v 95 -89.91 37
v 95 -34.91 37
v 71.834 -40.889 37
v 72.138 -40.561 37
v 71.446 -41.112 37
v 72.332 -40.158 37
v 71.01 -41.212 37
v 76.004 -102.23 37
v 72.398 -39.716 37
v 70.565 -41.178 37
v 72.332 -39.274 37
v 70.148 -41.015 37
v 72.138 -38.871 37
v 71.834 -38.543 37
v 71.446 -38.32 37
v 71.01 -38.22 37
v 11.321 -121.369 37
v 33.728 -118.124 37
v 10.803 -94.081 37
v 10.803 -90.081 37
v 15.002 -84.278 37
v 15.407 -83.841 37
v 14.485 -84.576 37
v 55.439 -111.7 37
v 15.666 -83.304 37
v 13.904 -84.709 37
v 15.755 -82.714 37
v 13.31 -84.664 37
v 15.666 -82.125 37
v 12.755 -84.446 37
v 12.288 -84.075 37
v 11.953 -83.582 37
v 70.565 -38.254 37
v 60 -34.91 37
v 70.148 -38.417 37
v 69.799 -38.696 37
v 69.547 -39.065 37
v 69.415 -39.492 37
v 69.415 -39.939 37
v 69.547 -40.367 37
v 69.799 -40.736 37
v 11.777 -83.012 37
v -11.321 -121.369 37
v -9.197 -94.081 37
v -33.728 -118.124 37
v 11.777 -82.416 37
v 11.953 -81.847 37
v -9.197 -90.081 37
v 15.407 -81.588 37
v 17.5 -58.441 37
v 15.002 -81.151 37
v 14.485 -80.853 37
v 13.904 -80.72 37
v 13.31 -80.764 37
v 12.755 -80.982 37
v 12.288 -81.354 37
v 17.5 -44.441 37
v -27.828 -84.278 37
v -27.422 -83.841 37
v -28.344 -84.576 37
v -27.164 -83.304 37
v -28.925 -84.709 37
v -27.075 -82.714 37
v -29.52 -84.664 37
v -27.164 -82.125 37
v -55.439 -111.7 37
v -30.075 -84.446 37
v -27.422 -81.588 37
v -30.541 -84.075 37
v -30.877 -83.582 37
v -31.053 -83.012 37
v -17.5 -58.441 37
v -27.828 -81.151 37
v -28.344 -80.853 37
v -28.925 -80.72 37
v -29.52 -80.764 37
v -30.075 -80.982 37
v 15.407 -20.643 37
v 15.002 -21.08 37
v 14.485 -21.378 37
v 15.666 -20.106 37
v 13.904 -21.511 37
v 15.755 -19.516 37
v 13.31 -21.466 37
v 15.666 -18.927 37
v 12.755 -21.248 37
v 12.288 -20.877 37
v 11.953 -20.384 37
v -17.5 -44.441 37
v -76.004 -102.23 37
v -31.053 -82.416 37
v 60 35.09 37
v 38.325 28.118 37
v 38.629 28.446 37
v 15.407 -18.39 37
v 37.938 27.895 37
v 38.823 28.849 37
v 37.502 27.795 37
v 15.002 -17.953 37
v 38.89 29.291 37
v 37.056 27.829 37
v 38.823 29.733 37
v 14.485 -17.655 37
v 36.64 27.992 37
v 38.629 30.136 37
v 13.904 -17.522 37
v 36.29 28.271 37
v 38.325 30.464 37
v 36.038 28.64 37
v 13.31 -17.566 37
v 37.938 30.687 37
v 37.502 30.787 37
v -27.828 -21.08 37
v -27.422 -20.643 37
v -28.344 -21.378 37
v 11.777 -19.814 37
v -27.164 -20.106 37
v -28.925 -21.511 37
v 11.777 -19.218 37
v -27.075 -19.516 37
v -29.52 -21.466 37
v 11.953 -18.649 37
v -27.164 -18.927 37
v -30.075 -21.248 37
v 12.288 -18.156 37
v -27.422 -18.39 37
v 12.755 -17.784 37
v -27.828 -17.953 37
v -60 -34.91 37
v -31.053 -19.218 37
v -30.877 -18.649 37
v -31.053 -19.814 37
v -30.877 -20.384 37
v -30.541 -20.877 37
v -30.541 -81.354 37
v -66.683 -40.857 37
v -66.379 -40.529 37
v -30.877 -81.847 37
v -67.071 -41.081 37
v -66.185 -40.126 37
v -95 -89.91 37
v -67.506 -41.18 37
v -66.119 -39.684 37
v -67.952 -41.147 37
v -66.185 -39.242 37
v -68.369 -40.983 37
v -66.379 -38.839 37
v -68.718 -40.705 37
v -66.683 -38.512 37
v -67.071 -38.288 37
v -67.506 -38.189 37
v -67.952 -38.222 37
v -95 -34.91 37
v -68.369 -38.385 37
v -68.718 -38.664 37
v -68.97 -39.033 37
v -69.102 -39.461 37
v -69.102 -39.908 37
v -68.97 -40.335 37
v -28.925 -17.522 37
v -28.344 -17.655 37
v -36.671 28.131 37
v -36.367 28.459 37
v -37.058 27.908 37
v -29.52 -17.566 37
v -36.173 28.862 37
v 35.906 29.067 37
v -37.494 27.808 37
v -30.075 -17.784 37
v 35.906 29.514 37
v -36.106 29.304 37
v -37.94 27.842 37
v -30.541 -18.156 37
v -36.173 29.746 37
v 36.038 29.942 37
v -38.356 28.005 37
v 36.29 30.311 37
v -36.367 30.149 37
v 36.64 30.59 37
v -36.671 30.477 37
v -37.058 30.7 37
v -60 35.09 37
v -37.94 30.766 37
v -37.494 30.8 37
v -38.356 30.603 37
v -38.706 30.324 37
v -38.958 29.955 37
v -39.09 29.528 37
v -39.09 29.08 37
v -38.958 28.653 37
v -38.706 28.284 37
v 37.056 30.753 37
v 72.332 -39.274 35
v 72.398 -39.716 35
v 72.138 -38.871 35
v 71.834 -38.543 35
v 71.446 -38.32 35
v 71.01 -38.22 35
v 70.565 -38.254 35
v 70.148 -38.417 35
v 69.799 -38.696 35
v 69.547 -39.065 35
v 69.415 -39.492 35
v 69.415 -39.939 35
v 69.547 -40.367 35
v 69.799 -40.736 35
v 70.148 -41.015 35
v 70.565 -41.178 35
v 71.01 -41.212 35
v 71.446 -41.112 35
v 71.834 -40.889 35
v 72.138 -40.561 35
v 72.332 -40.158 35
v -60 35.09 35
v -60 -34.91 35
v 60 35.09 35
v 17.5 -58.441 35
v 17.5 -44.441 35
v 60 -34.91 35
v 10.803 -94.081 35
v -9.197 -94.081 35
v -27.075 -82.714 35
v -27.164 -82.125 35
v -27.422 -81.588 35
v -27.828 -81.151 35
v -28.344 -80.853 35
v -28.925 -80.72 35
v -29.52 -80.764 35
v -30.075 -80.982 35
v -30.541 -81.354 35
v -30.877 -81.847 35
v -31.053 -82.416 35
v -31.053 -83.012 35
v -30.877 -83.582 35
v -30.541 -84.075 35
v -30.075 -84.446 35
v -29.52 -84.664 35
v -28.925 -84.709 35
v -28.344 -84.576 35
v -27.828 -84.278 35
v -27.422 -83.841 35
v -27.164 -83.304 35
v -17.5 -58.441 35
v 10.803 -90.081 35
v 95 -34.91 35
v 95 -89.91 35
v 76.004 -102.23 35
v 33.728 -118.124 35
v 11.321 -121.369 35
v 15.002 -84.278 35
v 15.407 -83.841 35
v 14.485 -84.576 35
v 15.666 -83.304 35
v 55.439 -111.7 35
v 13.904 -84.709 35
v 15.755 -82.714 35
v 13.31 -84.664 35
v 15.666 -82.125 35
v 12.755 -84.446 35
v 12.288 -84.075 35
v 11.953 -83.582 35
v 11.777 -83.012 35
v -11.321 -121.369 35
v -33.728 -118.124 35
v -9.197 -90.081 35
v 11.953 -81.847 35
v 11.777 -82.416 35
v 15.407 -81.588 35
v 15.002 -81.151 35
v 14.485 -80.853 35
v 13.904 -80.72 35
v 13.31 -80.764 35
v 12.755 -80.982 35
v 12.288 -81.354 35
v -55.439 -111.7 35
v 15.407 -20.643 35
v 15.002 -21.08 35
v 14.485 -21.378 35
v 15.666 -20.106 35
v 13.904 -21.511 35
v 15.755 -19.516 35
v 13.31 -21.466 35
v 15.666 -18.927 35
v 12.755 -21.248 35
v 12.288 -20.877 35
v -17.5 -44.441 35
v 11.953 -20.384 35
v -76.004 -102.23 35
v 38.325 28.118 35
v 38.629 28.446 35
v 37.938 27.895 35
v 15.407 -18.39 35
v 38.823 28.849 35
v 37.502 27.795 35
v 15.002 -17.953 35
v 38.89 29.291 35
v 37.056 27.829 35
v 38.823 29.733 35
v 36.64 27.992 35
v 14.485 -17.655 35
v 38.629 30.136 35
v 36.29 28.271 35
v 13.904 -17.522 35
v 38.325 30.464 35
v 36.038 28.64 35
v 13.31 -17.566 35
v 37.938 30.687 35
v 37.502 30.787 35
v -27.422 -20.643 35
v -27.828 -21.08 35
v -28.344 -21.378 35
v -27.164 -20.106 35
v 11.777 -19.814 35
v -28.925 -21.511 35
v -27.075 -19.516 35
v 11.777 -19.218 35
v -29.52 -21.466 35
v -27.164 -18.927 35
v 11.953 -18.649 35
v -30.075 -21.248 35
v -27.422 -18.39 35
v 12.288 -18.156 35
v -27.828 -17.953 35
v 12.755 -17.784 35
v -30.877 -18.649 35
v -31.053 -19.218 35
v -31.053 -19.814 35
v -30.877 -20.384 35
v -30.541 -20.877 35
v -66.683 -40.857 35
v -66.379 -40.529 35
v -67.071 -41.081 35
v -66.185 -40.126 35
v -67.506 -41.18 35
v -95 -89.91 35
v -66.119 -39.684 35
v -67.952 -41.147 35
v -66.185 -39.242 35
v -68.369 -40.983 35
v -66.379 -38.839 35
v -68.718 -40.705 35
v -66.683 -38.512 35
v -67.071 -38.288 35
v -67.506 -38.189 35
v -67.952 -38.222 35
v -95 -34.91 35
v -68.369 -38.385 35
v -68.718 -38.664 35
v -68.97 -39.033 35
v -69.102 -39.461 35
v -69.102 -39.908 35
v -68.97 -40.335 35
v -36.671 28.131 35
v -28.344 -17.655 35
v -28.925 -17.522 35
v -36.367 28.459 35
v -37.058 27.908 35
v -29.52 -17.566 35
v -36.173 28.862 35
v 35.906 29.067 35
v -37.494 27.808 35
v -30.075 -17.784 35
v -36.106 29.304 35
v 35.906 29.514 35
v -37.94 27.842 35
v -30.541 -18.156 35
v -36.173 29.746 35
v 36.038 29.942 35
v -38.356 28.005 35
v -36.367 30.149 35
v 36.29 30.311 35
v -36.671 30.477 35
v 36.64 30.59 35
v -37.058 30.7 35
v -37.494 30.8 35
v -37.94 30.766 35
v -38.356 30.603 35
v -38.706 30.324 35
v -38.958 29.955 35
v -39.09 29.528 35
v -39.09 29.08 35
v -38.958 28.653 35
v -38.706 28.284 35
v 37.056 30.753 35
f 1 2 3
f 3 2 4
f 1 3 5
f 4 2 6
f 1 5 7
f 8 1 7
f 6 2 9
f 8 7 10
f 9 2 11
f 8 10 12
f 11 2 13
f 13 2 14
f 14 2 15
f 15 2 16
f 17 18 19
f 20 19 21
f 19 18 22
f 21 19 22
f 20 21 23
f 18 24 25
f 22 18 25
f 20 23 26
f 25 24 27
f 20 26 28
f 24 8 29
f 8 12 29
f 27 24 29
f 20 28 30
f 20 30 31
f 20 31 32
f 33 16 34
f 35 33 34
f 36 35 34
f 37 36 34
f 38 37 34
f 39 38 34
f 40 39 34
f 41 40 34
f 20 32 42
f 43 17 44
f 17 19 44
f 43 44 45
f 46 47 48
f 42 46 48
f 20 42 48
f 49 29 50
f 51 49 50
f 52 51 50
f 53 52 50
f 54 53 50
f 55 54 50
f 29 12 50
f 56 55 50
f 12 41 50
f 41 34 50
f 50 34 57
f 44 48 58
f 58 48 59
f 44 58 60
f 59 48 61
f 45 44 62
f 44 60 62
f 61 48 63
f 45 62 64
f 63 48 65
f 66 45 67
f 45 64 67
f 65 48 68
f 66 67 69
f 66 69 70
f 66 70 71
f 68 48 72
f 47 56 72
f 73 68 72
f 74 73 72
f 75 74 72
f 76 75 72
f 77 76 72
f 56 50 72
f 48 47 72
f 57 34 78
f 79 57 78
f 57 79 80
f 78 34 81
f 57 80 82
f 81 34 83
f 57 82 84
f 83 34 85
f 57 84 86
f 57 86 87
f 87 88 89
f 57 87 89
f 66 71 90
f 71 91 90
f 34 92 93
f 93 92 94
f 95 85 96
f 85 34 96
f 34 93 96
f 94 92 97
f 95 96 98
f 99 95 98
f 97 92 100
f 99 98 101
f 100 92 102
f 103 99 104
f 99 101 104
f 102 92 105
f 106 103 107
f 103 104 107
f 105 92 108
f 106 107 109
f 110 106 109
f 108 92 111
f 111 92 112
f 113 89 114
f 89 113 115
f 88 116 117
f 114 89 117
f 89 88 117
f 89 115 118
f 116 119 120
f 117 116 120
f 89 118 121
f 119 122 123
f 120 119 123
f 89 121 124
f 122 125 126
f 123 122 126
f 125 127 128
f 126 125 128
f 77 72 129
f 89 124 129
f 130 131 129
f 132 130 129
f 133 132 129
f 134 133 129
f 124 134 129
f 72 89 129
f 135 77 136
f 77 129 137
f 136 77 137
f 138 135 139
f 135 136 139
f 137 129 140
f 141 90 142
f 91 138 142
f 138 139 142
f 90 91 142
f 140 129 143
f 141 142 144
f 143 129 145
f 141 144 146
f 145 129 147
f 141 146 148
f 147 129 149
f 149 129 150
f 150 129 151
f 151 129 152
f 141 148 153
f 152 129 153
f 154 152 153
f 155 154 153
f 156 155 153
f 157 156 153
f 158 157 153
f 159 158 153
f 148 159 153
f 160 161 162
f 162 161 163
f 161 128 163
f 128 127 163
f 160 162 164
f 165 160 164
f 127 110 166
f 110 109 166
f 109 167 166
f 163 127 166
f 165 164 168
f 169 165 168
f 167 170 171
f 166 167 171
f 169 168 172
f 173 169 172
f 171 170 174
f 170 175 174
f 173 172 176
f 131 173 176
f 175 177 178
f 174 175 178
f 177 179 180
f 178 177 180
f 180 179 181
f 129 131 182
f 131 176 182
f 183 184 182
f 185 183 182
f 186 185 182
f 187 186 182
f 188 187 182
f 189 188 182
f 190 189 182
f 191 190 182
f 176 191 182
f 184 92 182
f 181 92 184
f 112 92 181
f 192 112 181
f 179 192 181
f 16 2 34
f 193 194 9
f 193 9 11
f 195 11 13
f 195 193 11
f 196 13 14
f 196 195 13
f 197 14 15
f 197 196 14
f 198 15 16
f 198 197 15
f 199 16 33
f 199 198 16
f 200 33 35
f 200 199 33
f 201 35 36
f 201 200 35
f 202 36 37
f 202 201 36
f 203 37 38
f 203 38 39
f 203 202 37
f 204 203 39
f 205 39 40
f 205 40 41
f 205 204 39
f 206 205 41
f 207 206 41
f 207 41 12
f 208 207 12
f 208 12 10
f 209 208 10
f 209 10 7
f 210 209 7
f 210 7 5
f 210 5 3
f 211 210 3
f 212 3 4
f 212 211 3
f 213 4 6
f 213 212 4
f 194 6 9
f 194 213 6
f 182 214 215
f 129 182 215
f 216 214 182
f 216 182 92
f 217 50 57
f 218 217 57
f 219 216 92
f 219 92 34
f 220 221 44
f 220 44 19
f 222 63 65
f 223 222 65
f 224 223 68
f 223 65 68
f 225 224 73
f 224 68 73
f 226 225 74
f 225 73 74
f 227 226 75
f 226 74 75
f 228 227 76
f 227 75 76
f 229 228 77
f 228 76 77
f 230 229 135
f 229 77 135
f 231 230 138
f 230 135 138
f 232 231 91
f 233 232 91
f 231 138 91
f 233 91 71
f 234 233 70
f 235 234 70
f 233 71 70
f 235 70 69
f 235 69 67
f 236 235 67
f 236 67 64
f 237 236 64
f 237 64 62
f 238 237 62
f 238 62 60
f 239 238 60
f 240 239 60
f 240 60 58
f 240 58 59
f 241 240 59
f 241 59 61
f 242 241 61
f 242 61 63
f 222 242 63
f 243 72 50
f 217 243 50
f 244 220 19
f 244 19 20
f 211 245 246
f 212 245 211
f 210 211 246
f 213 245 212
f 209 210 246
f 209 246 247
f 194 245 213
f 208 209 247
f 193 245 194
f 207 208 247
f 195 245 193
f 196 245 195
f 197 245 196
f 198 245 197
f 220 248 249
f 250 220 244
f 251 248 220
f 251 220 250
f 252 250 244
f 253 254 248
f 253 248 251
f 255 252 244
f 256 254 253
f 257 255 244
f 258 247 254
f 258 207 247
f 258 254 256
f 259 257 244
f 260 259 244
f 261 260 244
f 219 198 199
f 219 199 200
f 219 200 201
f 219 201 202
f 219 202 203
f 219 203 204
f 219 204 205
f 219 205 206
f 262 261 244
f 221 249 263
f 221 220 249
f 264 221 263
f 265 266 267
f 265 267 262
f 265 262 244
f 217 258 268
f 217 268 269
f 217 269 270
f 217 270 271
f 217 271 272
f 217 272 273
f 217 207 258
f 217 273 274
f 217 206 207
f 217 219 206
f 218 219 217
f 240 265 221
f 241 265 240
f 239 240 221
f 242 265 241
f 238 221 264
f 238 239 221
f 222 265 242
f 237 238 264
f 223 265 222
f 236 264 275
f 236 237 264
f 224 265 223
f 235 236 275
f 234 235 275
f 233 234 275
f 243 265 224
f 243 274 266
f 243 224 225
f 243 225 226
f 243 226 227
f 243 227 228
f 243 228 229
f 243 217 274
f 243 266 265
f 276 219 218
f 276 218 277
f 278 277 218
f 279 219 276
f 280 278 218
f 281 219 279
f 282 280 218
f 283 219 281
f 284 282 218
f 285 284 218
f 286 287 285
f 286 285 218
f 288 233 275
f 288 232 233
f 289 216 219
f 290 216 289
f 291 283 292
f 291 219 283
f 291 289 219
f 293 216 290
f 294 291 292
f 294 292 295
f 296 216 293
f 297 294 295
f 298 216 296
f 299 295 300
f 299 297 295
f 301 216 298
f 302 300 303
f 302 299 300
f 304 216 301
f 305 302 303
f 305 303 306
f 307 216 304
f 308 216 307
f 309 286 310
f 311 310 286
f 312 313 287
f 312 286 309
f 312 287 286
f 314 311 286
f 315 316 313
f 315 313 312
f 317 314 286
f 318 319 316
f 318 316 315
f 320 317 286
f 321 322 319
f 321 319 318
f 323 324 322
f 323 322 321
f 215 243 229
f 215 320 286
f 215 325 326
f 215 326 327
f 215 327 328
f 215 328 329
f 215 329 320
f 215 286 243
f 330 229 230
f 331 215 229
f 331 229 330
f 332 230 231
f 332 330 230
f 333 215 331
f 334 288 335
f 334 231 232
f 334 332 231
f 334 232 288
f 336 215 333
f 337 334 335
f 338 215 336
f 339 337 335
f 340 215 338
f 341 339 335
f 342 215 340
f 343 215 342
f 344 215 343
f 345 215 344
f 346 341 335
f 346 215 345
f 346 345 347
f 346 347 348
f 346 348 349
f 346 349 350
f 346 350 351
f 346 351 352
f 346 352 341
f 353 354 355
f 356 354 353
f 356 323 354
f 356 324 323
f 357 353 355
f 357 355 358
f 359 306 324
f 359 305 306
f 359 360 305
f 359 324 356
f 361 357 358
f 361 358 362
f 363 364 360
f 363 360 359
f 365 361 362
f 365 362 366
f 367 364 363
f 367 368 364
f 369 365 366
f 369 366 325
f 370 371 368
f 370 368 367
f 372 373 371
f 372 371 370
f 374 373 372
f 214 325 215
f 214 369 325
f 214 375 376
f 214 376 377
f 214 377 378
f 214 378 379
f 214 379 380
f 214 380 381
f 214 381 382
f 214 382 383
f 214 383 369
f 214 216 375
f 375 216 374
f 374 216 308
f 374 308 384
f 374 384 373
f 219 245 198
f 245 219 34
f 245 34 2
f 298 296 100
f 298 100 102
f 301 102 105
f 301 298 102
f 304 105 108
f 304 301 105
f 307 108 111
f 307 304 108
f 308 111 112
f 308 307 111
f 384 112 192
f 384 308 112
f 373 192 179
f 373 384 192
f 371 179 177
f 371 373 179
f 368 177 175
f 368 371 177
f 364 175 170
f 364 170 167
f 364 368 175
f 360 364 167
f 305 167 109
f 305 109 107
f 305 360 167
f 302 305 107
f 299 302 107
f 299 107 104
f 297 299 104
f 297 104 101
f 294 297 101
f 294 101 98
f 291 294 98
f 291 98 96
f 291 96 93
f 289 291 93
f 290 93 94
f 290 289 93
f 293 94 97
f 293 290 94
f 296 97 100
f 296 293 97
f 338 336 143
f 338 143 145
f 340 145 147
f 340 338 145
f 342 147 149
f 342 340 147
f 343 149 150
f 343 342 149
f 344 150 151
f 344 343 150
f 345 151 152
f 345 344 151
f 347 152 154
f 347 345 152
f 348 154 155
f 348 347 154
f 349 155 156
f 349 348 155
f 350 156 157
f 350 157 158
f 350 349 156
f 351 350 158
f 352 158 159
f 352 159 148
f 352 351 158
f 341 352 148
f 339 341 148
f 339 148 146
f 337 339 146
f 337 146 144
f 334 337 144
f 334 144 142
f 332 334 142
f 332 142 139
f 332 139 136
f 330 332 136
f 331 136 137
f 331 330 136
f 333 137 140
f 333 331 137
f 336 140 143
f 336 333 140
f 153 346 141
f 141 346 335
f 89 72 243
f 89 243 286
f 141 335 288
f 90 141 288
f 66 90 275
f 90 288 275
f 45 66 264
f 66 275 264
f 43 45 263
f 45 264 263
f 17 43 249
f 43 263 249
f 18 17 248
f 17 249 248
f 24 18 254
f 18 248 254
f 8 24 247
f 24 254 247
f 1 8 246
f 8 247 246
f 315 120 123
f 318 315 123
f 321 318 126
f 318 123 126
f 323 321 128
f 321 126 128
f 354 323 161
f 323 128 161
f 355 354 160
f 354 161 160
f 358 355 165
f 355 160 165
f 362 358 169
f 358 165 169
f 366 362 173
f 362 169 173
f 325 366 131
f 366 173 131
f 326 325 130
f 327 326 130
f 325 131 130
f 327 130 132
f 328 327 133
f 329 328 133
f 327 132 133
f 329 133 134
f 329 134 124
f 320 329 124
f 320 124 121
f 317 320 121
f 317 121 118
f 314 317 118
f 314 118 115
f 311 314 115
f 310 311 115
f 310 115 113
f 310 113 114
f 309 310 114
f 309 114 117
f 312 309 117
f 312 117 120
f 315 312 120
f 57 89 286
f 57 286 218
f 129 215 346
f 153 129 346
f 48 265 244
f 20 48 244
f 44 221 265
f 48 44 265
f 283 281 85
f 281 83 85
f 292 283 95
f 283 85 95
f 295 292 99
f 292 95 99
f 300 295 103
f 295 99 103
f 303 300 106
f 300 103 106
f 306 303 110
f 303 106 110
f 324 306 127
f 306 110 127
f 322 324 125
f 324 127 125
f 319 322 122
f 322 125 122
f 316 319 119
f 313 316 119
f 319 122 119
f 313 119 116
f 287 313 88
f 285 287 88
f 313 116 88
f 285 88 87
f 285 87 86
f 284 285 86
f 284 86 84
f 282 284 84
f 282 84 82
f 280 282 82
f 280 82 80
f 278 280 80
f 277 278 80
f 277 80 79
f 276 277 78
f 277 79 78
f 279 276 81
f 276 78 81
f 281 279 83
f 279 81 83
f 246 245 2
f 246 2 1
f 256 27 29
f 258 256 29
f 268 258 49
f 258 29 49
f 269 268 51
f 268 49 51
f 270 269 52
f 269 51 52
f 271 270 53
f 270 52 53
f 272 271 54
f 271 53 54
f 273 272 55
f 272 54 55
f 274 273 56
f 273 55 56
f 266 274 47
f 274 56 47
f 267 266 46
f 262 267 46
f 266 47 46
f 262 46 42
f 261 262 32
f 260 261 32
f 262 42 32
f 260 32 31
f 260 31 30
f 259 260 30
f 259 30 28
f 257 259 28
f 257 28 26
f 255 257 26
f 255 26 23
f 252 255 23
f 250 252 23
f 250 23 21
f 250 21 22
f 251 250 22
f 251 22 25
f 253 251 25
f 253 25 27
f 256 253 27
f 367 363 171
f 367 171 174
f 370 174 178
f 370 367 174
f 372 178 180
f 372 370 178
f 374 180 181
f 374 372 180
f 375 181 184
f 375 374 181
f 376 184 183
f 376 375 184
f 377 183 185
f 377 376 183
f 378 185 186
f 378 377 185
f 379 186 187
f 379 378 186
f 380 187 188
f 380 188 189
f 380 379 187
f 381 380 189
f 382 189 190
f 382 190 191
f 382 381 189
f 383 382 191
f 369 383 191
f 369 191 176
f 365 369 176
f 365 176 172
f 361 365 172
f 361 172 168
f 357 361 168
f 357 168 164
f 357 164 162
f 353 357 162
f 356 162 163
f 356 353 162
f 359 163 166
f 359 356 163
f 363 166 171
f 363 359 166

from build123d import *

# Parameters (mm, degrees)
SKETCH049_R      = 2
EXTRUDE050_DEPTH = 15
SKETCH044_W      = 35
SKETCH044_H      = 14
EXTRUDE043_DEPTH = 15
SKETCH040_R      = 1.5
SKETCH040_W      = 20
SKETCH040_H      = 4
EXTRUDE039_DEPTH = 2


with BuildPart() as weapon_cover_screw_holes001:
    # Sketch049 (on Face6 of Cut025) → Extrude050 (new body, symmetric)
    with BuildSketch(Plane.XY.offset(39.2)):
        with Locations((-29.074951, -82.714325)):
            Circle(SKETCH049_R)
        with Locations((13.75458, -82.714325)):
            Circle(SKETCH049_R)
        with Locations((-29.074951, -19.516283)):
            Circle(SKETCH049_R)
        with Locations((13.75458, -19.516283)):
            Circle(SKETCH049_R)
    extrude(amount=EXTRUDE050_DEPTH, both=True)


with BuildPart() as servo_lid_gap:
    # Sketch044 (on Face8 of Cut013) → Extrude043 (new body, symmetric)
    with BuildSketch(Plane.XY.offset(38)):
        with Locations((0, -51.440889)):
            Rectangle(SKETCH044_W, SKETCH044_H)
    extrude(amount=EXTRUDE043_DEPTH, both=True)


with BuildPart() as lid:
    # Sketch040 (on Face4 of Cut018) → Extrude039 (new body)
    with BuildSketch(Plane.XY.offset(35)):
        with BuildLine():
            Line((-60, 35.090242), (60, 35.090242))
            Line((60, 35.090242), (60, -34.909758))
            Line((60, -34.909758), (95, -34.909758))
            Line((95, -34.909758), (95, -89.909758))
            ThreePointArc((-95, -89.909758), (0, -121.776758), (95, -89.909758))
            Line((-95, -34.909758), (-95, -89.909758))
            Line((-60, -34.909758), (-95, -34.909758))
            Line((-60, 35.090242), (-60, -34.909758))
        make_face()
        with Locations((70.898361, -39.7159)):
            Circle(SKETCH040_R, mode=Mode.SUBTRACT)
        with Locations((37.389542, 29.290899)):
            Circle(SKETCH040_R, mode=Mode.SUBTRACT)
        with Locations((-37.606323, 29.30405)):
            Circle(SKETCH040_R, mode=Mode.SUBTRACT)
        with Locations((-67.618576, -39.684311)):
            Circle(SKETCH040_R, mode=Mode.SUBTRACT)
        with Locations((0.80288, -92.081482)):
            Rectangle(SKETCH040_W, SKETCH040_H, mode=Mode.SUBTRACT)
    extrude(amount=EXTRUDE039_DEPTH)

    # Cut022: cut Servo Lid Gap
    add(servo_lid_gap.part, mode=Mode.SUBTRACT)

    # Cut027: cut Weapon Cover Screw Holes001
    add(weapon_cover_screw_holes001.part, mode=Mode.SUBTRACT)


solid = lid.part
